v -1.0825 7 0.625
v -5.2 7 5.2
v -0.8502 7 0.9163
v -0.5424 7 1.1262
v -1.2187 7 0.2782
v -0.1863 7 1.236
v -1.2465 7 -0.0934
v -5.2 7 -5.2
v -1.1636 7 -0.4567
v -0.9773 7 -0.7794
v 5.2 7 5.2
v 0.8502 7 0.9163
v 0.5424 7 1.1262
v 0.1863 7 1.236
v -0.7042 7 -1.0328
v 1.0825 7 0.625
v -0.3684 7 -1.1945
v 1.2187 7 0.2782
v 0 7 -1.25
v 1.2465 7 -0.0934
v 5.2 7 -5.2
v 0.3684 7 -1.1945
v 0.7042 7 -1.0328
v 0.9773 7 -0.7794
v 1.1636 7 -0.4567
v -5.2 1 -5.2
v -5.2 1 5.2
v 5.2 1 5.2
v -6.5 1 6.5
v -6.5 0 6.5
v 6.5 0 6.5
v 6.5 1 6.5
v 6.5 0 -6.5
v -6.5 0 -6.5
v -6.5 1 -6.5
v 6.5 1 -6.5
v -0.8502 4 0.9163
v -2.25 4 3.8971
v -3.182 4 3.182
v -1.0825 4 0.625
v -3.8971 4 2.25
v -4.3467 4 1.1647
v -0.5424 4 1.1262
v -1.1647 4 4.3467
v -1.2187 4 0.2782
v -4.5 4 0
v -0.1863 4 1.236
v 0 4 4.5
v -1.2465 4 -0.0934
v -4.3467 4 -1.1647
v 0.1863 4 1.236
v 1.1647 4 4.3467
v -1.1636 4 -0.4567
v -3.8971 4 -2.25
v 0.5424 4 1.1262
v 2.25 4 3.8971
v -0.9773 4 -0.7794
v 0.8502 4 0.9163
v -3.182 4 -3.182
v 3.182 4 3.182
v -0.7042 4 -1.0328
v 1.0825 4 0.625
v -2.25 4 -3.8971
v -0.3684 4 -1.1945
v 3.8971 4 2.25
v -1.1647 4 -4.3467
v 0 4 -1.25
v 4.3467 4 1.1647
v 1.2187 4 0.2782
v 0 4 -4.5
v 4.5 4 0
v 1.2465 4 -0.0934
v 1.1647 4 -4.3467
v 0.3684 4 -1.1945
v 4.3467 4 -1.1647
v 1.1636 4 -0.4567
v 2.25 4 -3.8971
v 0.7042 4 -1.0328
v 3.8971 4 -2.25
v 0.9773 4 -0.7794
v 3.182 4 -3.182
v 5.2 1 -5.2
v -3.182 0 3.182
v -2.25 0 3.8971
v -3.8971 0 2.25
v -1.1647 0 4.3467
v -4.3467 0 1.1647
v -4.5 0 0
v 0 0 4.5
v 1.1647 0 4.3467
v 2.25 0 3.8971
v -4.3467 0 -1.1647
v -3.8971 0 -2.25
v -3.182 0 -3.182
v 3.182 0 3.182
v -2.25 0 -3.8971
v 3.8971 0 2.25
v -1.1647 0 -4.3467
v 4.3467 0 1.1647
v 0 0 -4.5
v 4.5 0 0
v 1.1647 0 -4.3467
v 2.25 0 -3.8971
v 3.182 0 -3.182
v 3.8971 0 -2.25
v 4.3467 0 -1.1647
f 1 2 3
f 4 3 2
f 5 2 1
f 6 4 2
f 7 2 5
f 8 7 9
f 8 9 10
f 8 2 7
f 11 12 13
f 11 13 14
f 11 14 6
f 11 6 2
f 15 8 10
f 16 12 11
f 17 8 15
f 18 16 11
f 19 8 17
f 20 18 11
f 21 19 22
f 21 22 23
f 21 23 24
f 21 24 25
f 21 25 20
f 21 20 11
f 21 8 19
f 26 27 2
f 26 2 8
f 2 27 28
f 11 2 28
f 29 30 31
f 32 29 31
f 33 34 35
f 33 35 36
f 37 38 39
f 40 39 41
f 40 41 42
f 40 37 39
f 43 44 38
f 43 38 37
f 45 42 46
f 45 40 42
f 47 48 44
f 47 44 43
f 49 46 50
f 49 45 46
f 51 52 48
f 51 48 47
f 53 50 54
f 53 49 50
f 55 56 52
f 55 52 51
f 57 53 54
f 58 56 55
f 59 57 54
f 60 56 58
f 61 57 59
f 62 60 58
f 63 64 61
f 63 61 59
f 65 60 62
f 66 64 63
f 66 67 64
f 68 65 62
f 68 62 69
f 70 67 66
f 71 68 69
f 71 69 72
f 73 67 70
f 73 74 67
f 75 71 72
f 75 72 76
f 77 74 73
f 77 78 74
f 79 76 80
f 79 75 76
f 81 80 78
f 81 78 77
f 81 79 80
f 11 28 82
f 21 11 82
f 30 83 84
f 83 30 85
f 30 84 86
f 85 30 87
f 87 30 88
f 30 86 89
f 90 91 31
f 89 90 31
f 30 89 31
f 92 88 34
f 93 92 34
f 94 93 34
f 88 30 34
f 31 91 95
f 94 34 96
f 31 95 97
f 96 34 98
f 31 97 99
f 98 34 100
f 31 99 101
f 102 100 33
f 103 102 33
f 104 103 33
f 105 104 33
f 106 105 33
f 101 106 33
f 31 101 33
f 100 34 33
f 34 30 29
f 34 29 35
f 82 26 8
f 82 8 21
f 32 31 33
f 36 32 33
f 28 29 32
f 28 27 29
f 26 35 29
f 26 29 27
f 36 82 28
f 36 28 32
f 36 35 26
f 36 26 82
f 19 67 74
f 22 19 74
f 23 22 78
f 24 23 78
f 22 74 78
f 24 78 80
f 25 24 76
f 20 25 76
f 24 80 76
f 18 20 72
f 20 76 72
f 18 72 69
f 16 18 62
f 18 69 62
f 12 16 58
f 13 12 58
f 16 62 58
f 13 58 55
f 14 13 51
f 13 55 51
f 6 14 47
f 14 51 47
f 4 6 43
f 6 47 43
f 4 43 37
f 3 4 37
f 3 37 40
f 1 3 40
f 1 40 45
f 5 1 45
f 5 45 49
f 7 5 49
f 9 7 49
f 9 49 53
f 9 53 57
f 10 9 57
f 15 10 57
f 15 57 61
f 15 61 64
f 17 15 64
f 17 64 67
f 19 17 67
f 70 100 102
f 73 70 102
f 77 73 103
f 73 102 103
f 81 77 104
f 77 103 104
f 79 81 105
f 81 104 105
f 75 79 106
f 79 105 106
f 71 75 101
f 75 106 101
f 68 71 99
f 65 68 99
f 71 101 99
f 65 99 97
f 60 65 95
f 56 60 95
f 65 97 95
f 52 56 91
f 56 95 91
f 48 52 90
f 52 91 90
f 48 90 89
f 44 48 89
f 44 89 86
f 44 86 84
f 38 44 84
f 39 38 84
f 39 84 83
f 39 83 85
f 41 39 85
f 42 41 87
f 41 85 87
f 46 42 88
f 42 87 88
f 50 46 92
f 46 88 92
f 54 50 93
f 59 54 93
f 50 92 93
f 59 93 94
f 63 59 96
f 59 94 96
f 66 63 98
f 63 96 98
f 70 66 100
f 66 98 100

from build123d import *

# Parameters (mm, degrees)
SKETCH1_W           = 13
SKETCH1_H           = 13
BOSS_EXTRUDE1_DEPTH = 1
SKETCH2_W           = 10.4
SKETCH2_H           = 10.4
BOSS_EXTRUDE2_DEPTH = 6
SKETCH3_R           = 4.5
CUT_EXTRUDE1_DEPTH  = 4
SKETCH4_R           = 1.25
CUT_EXTRUDE2_DEPTH  = 11.024968828


with BuildPart() as part:
    # Sketch1 → Boss-Extrude1 (new body)
    with BuildSketch(Plane(origin=(0, 0, 0), x_dir=(1, 0, 0), z_dir=(0, 1, 0))):
        Rectangle(SKETCH1_W, SKETCH1_H)
    extrude(amount=BOSS_EXTRUDE1_DEPTH)

    # Sketch2 → Boss-Extrude2 (add)
    with BuildSketch(Plane(origin=(0, 1, 0), x_dir=(1, 0, 0), z_dir=(0, 1, 0))):
        Rectangle(SKETCH2_W, SKETCH2_H)
    extrude(amount=BOSS_EXTRUDE2_DEPTH)

    # Sketch3 → Cut-Extrude1 (cut)
    with BuildSketch(Plane.XZ):
        with Locations(Location((0, 0, 0), (0, 0, 270))):
            Circle(SKETCH3_R)
    extrude(amount=-CUT_EXTRUDE1_DEPTH, mode=Mode.SUBTRACT)

    # Sketch4 → Cut-Extrude2 (cut, through all)
    with BuildSketch(Plane.XZ.offset(-4)):
        with Locations(Location((0, 0, 0), (0, 0, 270))):
            Circle(SKETCH4_R)
    extrude(amount=-CUT_EXTRUDE2_DEPTH, mode=Mode.SUBTRACT)


solid = part.part
